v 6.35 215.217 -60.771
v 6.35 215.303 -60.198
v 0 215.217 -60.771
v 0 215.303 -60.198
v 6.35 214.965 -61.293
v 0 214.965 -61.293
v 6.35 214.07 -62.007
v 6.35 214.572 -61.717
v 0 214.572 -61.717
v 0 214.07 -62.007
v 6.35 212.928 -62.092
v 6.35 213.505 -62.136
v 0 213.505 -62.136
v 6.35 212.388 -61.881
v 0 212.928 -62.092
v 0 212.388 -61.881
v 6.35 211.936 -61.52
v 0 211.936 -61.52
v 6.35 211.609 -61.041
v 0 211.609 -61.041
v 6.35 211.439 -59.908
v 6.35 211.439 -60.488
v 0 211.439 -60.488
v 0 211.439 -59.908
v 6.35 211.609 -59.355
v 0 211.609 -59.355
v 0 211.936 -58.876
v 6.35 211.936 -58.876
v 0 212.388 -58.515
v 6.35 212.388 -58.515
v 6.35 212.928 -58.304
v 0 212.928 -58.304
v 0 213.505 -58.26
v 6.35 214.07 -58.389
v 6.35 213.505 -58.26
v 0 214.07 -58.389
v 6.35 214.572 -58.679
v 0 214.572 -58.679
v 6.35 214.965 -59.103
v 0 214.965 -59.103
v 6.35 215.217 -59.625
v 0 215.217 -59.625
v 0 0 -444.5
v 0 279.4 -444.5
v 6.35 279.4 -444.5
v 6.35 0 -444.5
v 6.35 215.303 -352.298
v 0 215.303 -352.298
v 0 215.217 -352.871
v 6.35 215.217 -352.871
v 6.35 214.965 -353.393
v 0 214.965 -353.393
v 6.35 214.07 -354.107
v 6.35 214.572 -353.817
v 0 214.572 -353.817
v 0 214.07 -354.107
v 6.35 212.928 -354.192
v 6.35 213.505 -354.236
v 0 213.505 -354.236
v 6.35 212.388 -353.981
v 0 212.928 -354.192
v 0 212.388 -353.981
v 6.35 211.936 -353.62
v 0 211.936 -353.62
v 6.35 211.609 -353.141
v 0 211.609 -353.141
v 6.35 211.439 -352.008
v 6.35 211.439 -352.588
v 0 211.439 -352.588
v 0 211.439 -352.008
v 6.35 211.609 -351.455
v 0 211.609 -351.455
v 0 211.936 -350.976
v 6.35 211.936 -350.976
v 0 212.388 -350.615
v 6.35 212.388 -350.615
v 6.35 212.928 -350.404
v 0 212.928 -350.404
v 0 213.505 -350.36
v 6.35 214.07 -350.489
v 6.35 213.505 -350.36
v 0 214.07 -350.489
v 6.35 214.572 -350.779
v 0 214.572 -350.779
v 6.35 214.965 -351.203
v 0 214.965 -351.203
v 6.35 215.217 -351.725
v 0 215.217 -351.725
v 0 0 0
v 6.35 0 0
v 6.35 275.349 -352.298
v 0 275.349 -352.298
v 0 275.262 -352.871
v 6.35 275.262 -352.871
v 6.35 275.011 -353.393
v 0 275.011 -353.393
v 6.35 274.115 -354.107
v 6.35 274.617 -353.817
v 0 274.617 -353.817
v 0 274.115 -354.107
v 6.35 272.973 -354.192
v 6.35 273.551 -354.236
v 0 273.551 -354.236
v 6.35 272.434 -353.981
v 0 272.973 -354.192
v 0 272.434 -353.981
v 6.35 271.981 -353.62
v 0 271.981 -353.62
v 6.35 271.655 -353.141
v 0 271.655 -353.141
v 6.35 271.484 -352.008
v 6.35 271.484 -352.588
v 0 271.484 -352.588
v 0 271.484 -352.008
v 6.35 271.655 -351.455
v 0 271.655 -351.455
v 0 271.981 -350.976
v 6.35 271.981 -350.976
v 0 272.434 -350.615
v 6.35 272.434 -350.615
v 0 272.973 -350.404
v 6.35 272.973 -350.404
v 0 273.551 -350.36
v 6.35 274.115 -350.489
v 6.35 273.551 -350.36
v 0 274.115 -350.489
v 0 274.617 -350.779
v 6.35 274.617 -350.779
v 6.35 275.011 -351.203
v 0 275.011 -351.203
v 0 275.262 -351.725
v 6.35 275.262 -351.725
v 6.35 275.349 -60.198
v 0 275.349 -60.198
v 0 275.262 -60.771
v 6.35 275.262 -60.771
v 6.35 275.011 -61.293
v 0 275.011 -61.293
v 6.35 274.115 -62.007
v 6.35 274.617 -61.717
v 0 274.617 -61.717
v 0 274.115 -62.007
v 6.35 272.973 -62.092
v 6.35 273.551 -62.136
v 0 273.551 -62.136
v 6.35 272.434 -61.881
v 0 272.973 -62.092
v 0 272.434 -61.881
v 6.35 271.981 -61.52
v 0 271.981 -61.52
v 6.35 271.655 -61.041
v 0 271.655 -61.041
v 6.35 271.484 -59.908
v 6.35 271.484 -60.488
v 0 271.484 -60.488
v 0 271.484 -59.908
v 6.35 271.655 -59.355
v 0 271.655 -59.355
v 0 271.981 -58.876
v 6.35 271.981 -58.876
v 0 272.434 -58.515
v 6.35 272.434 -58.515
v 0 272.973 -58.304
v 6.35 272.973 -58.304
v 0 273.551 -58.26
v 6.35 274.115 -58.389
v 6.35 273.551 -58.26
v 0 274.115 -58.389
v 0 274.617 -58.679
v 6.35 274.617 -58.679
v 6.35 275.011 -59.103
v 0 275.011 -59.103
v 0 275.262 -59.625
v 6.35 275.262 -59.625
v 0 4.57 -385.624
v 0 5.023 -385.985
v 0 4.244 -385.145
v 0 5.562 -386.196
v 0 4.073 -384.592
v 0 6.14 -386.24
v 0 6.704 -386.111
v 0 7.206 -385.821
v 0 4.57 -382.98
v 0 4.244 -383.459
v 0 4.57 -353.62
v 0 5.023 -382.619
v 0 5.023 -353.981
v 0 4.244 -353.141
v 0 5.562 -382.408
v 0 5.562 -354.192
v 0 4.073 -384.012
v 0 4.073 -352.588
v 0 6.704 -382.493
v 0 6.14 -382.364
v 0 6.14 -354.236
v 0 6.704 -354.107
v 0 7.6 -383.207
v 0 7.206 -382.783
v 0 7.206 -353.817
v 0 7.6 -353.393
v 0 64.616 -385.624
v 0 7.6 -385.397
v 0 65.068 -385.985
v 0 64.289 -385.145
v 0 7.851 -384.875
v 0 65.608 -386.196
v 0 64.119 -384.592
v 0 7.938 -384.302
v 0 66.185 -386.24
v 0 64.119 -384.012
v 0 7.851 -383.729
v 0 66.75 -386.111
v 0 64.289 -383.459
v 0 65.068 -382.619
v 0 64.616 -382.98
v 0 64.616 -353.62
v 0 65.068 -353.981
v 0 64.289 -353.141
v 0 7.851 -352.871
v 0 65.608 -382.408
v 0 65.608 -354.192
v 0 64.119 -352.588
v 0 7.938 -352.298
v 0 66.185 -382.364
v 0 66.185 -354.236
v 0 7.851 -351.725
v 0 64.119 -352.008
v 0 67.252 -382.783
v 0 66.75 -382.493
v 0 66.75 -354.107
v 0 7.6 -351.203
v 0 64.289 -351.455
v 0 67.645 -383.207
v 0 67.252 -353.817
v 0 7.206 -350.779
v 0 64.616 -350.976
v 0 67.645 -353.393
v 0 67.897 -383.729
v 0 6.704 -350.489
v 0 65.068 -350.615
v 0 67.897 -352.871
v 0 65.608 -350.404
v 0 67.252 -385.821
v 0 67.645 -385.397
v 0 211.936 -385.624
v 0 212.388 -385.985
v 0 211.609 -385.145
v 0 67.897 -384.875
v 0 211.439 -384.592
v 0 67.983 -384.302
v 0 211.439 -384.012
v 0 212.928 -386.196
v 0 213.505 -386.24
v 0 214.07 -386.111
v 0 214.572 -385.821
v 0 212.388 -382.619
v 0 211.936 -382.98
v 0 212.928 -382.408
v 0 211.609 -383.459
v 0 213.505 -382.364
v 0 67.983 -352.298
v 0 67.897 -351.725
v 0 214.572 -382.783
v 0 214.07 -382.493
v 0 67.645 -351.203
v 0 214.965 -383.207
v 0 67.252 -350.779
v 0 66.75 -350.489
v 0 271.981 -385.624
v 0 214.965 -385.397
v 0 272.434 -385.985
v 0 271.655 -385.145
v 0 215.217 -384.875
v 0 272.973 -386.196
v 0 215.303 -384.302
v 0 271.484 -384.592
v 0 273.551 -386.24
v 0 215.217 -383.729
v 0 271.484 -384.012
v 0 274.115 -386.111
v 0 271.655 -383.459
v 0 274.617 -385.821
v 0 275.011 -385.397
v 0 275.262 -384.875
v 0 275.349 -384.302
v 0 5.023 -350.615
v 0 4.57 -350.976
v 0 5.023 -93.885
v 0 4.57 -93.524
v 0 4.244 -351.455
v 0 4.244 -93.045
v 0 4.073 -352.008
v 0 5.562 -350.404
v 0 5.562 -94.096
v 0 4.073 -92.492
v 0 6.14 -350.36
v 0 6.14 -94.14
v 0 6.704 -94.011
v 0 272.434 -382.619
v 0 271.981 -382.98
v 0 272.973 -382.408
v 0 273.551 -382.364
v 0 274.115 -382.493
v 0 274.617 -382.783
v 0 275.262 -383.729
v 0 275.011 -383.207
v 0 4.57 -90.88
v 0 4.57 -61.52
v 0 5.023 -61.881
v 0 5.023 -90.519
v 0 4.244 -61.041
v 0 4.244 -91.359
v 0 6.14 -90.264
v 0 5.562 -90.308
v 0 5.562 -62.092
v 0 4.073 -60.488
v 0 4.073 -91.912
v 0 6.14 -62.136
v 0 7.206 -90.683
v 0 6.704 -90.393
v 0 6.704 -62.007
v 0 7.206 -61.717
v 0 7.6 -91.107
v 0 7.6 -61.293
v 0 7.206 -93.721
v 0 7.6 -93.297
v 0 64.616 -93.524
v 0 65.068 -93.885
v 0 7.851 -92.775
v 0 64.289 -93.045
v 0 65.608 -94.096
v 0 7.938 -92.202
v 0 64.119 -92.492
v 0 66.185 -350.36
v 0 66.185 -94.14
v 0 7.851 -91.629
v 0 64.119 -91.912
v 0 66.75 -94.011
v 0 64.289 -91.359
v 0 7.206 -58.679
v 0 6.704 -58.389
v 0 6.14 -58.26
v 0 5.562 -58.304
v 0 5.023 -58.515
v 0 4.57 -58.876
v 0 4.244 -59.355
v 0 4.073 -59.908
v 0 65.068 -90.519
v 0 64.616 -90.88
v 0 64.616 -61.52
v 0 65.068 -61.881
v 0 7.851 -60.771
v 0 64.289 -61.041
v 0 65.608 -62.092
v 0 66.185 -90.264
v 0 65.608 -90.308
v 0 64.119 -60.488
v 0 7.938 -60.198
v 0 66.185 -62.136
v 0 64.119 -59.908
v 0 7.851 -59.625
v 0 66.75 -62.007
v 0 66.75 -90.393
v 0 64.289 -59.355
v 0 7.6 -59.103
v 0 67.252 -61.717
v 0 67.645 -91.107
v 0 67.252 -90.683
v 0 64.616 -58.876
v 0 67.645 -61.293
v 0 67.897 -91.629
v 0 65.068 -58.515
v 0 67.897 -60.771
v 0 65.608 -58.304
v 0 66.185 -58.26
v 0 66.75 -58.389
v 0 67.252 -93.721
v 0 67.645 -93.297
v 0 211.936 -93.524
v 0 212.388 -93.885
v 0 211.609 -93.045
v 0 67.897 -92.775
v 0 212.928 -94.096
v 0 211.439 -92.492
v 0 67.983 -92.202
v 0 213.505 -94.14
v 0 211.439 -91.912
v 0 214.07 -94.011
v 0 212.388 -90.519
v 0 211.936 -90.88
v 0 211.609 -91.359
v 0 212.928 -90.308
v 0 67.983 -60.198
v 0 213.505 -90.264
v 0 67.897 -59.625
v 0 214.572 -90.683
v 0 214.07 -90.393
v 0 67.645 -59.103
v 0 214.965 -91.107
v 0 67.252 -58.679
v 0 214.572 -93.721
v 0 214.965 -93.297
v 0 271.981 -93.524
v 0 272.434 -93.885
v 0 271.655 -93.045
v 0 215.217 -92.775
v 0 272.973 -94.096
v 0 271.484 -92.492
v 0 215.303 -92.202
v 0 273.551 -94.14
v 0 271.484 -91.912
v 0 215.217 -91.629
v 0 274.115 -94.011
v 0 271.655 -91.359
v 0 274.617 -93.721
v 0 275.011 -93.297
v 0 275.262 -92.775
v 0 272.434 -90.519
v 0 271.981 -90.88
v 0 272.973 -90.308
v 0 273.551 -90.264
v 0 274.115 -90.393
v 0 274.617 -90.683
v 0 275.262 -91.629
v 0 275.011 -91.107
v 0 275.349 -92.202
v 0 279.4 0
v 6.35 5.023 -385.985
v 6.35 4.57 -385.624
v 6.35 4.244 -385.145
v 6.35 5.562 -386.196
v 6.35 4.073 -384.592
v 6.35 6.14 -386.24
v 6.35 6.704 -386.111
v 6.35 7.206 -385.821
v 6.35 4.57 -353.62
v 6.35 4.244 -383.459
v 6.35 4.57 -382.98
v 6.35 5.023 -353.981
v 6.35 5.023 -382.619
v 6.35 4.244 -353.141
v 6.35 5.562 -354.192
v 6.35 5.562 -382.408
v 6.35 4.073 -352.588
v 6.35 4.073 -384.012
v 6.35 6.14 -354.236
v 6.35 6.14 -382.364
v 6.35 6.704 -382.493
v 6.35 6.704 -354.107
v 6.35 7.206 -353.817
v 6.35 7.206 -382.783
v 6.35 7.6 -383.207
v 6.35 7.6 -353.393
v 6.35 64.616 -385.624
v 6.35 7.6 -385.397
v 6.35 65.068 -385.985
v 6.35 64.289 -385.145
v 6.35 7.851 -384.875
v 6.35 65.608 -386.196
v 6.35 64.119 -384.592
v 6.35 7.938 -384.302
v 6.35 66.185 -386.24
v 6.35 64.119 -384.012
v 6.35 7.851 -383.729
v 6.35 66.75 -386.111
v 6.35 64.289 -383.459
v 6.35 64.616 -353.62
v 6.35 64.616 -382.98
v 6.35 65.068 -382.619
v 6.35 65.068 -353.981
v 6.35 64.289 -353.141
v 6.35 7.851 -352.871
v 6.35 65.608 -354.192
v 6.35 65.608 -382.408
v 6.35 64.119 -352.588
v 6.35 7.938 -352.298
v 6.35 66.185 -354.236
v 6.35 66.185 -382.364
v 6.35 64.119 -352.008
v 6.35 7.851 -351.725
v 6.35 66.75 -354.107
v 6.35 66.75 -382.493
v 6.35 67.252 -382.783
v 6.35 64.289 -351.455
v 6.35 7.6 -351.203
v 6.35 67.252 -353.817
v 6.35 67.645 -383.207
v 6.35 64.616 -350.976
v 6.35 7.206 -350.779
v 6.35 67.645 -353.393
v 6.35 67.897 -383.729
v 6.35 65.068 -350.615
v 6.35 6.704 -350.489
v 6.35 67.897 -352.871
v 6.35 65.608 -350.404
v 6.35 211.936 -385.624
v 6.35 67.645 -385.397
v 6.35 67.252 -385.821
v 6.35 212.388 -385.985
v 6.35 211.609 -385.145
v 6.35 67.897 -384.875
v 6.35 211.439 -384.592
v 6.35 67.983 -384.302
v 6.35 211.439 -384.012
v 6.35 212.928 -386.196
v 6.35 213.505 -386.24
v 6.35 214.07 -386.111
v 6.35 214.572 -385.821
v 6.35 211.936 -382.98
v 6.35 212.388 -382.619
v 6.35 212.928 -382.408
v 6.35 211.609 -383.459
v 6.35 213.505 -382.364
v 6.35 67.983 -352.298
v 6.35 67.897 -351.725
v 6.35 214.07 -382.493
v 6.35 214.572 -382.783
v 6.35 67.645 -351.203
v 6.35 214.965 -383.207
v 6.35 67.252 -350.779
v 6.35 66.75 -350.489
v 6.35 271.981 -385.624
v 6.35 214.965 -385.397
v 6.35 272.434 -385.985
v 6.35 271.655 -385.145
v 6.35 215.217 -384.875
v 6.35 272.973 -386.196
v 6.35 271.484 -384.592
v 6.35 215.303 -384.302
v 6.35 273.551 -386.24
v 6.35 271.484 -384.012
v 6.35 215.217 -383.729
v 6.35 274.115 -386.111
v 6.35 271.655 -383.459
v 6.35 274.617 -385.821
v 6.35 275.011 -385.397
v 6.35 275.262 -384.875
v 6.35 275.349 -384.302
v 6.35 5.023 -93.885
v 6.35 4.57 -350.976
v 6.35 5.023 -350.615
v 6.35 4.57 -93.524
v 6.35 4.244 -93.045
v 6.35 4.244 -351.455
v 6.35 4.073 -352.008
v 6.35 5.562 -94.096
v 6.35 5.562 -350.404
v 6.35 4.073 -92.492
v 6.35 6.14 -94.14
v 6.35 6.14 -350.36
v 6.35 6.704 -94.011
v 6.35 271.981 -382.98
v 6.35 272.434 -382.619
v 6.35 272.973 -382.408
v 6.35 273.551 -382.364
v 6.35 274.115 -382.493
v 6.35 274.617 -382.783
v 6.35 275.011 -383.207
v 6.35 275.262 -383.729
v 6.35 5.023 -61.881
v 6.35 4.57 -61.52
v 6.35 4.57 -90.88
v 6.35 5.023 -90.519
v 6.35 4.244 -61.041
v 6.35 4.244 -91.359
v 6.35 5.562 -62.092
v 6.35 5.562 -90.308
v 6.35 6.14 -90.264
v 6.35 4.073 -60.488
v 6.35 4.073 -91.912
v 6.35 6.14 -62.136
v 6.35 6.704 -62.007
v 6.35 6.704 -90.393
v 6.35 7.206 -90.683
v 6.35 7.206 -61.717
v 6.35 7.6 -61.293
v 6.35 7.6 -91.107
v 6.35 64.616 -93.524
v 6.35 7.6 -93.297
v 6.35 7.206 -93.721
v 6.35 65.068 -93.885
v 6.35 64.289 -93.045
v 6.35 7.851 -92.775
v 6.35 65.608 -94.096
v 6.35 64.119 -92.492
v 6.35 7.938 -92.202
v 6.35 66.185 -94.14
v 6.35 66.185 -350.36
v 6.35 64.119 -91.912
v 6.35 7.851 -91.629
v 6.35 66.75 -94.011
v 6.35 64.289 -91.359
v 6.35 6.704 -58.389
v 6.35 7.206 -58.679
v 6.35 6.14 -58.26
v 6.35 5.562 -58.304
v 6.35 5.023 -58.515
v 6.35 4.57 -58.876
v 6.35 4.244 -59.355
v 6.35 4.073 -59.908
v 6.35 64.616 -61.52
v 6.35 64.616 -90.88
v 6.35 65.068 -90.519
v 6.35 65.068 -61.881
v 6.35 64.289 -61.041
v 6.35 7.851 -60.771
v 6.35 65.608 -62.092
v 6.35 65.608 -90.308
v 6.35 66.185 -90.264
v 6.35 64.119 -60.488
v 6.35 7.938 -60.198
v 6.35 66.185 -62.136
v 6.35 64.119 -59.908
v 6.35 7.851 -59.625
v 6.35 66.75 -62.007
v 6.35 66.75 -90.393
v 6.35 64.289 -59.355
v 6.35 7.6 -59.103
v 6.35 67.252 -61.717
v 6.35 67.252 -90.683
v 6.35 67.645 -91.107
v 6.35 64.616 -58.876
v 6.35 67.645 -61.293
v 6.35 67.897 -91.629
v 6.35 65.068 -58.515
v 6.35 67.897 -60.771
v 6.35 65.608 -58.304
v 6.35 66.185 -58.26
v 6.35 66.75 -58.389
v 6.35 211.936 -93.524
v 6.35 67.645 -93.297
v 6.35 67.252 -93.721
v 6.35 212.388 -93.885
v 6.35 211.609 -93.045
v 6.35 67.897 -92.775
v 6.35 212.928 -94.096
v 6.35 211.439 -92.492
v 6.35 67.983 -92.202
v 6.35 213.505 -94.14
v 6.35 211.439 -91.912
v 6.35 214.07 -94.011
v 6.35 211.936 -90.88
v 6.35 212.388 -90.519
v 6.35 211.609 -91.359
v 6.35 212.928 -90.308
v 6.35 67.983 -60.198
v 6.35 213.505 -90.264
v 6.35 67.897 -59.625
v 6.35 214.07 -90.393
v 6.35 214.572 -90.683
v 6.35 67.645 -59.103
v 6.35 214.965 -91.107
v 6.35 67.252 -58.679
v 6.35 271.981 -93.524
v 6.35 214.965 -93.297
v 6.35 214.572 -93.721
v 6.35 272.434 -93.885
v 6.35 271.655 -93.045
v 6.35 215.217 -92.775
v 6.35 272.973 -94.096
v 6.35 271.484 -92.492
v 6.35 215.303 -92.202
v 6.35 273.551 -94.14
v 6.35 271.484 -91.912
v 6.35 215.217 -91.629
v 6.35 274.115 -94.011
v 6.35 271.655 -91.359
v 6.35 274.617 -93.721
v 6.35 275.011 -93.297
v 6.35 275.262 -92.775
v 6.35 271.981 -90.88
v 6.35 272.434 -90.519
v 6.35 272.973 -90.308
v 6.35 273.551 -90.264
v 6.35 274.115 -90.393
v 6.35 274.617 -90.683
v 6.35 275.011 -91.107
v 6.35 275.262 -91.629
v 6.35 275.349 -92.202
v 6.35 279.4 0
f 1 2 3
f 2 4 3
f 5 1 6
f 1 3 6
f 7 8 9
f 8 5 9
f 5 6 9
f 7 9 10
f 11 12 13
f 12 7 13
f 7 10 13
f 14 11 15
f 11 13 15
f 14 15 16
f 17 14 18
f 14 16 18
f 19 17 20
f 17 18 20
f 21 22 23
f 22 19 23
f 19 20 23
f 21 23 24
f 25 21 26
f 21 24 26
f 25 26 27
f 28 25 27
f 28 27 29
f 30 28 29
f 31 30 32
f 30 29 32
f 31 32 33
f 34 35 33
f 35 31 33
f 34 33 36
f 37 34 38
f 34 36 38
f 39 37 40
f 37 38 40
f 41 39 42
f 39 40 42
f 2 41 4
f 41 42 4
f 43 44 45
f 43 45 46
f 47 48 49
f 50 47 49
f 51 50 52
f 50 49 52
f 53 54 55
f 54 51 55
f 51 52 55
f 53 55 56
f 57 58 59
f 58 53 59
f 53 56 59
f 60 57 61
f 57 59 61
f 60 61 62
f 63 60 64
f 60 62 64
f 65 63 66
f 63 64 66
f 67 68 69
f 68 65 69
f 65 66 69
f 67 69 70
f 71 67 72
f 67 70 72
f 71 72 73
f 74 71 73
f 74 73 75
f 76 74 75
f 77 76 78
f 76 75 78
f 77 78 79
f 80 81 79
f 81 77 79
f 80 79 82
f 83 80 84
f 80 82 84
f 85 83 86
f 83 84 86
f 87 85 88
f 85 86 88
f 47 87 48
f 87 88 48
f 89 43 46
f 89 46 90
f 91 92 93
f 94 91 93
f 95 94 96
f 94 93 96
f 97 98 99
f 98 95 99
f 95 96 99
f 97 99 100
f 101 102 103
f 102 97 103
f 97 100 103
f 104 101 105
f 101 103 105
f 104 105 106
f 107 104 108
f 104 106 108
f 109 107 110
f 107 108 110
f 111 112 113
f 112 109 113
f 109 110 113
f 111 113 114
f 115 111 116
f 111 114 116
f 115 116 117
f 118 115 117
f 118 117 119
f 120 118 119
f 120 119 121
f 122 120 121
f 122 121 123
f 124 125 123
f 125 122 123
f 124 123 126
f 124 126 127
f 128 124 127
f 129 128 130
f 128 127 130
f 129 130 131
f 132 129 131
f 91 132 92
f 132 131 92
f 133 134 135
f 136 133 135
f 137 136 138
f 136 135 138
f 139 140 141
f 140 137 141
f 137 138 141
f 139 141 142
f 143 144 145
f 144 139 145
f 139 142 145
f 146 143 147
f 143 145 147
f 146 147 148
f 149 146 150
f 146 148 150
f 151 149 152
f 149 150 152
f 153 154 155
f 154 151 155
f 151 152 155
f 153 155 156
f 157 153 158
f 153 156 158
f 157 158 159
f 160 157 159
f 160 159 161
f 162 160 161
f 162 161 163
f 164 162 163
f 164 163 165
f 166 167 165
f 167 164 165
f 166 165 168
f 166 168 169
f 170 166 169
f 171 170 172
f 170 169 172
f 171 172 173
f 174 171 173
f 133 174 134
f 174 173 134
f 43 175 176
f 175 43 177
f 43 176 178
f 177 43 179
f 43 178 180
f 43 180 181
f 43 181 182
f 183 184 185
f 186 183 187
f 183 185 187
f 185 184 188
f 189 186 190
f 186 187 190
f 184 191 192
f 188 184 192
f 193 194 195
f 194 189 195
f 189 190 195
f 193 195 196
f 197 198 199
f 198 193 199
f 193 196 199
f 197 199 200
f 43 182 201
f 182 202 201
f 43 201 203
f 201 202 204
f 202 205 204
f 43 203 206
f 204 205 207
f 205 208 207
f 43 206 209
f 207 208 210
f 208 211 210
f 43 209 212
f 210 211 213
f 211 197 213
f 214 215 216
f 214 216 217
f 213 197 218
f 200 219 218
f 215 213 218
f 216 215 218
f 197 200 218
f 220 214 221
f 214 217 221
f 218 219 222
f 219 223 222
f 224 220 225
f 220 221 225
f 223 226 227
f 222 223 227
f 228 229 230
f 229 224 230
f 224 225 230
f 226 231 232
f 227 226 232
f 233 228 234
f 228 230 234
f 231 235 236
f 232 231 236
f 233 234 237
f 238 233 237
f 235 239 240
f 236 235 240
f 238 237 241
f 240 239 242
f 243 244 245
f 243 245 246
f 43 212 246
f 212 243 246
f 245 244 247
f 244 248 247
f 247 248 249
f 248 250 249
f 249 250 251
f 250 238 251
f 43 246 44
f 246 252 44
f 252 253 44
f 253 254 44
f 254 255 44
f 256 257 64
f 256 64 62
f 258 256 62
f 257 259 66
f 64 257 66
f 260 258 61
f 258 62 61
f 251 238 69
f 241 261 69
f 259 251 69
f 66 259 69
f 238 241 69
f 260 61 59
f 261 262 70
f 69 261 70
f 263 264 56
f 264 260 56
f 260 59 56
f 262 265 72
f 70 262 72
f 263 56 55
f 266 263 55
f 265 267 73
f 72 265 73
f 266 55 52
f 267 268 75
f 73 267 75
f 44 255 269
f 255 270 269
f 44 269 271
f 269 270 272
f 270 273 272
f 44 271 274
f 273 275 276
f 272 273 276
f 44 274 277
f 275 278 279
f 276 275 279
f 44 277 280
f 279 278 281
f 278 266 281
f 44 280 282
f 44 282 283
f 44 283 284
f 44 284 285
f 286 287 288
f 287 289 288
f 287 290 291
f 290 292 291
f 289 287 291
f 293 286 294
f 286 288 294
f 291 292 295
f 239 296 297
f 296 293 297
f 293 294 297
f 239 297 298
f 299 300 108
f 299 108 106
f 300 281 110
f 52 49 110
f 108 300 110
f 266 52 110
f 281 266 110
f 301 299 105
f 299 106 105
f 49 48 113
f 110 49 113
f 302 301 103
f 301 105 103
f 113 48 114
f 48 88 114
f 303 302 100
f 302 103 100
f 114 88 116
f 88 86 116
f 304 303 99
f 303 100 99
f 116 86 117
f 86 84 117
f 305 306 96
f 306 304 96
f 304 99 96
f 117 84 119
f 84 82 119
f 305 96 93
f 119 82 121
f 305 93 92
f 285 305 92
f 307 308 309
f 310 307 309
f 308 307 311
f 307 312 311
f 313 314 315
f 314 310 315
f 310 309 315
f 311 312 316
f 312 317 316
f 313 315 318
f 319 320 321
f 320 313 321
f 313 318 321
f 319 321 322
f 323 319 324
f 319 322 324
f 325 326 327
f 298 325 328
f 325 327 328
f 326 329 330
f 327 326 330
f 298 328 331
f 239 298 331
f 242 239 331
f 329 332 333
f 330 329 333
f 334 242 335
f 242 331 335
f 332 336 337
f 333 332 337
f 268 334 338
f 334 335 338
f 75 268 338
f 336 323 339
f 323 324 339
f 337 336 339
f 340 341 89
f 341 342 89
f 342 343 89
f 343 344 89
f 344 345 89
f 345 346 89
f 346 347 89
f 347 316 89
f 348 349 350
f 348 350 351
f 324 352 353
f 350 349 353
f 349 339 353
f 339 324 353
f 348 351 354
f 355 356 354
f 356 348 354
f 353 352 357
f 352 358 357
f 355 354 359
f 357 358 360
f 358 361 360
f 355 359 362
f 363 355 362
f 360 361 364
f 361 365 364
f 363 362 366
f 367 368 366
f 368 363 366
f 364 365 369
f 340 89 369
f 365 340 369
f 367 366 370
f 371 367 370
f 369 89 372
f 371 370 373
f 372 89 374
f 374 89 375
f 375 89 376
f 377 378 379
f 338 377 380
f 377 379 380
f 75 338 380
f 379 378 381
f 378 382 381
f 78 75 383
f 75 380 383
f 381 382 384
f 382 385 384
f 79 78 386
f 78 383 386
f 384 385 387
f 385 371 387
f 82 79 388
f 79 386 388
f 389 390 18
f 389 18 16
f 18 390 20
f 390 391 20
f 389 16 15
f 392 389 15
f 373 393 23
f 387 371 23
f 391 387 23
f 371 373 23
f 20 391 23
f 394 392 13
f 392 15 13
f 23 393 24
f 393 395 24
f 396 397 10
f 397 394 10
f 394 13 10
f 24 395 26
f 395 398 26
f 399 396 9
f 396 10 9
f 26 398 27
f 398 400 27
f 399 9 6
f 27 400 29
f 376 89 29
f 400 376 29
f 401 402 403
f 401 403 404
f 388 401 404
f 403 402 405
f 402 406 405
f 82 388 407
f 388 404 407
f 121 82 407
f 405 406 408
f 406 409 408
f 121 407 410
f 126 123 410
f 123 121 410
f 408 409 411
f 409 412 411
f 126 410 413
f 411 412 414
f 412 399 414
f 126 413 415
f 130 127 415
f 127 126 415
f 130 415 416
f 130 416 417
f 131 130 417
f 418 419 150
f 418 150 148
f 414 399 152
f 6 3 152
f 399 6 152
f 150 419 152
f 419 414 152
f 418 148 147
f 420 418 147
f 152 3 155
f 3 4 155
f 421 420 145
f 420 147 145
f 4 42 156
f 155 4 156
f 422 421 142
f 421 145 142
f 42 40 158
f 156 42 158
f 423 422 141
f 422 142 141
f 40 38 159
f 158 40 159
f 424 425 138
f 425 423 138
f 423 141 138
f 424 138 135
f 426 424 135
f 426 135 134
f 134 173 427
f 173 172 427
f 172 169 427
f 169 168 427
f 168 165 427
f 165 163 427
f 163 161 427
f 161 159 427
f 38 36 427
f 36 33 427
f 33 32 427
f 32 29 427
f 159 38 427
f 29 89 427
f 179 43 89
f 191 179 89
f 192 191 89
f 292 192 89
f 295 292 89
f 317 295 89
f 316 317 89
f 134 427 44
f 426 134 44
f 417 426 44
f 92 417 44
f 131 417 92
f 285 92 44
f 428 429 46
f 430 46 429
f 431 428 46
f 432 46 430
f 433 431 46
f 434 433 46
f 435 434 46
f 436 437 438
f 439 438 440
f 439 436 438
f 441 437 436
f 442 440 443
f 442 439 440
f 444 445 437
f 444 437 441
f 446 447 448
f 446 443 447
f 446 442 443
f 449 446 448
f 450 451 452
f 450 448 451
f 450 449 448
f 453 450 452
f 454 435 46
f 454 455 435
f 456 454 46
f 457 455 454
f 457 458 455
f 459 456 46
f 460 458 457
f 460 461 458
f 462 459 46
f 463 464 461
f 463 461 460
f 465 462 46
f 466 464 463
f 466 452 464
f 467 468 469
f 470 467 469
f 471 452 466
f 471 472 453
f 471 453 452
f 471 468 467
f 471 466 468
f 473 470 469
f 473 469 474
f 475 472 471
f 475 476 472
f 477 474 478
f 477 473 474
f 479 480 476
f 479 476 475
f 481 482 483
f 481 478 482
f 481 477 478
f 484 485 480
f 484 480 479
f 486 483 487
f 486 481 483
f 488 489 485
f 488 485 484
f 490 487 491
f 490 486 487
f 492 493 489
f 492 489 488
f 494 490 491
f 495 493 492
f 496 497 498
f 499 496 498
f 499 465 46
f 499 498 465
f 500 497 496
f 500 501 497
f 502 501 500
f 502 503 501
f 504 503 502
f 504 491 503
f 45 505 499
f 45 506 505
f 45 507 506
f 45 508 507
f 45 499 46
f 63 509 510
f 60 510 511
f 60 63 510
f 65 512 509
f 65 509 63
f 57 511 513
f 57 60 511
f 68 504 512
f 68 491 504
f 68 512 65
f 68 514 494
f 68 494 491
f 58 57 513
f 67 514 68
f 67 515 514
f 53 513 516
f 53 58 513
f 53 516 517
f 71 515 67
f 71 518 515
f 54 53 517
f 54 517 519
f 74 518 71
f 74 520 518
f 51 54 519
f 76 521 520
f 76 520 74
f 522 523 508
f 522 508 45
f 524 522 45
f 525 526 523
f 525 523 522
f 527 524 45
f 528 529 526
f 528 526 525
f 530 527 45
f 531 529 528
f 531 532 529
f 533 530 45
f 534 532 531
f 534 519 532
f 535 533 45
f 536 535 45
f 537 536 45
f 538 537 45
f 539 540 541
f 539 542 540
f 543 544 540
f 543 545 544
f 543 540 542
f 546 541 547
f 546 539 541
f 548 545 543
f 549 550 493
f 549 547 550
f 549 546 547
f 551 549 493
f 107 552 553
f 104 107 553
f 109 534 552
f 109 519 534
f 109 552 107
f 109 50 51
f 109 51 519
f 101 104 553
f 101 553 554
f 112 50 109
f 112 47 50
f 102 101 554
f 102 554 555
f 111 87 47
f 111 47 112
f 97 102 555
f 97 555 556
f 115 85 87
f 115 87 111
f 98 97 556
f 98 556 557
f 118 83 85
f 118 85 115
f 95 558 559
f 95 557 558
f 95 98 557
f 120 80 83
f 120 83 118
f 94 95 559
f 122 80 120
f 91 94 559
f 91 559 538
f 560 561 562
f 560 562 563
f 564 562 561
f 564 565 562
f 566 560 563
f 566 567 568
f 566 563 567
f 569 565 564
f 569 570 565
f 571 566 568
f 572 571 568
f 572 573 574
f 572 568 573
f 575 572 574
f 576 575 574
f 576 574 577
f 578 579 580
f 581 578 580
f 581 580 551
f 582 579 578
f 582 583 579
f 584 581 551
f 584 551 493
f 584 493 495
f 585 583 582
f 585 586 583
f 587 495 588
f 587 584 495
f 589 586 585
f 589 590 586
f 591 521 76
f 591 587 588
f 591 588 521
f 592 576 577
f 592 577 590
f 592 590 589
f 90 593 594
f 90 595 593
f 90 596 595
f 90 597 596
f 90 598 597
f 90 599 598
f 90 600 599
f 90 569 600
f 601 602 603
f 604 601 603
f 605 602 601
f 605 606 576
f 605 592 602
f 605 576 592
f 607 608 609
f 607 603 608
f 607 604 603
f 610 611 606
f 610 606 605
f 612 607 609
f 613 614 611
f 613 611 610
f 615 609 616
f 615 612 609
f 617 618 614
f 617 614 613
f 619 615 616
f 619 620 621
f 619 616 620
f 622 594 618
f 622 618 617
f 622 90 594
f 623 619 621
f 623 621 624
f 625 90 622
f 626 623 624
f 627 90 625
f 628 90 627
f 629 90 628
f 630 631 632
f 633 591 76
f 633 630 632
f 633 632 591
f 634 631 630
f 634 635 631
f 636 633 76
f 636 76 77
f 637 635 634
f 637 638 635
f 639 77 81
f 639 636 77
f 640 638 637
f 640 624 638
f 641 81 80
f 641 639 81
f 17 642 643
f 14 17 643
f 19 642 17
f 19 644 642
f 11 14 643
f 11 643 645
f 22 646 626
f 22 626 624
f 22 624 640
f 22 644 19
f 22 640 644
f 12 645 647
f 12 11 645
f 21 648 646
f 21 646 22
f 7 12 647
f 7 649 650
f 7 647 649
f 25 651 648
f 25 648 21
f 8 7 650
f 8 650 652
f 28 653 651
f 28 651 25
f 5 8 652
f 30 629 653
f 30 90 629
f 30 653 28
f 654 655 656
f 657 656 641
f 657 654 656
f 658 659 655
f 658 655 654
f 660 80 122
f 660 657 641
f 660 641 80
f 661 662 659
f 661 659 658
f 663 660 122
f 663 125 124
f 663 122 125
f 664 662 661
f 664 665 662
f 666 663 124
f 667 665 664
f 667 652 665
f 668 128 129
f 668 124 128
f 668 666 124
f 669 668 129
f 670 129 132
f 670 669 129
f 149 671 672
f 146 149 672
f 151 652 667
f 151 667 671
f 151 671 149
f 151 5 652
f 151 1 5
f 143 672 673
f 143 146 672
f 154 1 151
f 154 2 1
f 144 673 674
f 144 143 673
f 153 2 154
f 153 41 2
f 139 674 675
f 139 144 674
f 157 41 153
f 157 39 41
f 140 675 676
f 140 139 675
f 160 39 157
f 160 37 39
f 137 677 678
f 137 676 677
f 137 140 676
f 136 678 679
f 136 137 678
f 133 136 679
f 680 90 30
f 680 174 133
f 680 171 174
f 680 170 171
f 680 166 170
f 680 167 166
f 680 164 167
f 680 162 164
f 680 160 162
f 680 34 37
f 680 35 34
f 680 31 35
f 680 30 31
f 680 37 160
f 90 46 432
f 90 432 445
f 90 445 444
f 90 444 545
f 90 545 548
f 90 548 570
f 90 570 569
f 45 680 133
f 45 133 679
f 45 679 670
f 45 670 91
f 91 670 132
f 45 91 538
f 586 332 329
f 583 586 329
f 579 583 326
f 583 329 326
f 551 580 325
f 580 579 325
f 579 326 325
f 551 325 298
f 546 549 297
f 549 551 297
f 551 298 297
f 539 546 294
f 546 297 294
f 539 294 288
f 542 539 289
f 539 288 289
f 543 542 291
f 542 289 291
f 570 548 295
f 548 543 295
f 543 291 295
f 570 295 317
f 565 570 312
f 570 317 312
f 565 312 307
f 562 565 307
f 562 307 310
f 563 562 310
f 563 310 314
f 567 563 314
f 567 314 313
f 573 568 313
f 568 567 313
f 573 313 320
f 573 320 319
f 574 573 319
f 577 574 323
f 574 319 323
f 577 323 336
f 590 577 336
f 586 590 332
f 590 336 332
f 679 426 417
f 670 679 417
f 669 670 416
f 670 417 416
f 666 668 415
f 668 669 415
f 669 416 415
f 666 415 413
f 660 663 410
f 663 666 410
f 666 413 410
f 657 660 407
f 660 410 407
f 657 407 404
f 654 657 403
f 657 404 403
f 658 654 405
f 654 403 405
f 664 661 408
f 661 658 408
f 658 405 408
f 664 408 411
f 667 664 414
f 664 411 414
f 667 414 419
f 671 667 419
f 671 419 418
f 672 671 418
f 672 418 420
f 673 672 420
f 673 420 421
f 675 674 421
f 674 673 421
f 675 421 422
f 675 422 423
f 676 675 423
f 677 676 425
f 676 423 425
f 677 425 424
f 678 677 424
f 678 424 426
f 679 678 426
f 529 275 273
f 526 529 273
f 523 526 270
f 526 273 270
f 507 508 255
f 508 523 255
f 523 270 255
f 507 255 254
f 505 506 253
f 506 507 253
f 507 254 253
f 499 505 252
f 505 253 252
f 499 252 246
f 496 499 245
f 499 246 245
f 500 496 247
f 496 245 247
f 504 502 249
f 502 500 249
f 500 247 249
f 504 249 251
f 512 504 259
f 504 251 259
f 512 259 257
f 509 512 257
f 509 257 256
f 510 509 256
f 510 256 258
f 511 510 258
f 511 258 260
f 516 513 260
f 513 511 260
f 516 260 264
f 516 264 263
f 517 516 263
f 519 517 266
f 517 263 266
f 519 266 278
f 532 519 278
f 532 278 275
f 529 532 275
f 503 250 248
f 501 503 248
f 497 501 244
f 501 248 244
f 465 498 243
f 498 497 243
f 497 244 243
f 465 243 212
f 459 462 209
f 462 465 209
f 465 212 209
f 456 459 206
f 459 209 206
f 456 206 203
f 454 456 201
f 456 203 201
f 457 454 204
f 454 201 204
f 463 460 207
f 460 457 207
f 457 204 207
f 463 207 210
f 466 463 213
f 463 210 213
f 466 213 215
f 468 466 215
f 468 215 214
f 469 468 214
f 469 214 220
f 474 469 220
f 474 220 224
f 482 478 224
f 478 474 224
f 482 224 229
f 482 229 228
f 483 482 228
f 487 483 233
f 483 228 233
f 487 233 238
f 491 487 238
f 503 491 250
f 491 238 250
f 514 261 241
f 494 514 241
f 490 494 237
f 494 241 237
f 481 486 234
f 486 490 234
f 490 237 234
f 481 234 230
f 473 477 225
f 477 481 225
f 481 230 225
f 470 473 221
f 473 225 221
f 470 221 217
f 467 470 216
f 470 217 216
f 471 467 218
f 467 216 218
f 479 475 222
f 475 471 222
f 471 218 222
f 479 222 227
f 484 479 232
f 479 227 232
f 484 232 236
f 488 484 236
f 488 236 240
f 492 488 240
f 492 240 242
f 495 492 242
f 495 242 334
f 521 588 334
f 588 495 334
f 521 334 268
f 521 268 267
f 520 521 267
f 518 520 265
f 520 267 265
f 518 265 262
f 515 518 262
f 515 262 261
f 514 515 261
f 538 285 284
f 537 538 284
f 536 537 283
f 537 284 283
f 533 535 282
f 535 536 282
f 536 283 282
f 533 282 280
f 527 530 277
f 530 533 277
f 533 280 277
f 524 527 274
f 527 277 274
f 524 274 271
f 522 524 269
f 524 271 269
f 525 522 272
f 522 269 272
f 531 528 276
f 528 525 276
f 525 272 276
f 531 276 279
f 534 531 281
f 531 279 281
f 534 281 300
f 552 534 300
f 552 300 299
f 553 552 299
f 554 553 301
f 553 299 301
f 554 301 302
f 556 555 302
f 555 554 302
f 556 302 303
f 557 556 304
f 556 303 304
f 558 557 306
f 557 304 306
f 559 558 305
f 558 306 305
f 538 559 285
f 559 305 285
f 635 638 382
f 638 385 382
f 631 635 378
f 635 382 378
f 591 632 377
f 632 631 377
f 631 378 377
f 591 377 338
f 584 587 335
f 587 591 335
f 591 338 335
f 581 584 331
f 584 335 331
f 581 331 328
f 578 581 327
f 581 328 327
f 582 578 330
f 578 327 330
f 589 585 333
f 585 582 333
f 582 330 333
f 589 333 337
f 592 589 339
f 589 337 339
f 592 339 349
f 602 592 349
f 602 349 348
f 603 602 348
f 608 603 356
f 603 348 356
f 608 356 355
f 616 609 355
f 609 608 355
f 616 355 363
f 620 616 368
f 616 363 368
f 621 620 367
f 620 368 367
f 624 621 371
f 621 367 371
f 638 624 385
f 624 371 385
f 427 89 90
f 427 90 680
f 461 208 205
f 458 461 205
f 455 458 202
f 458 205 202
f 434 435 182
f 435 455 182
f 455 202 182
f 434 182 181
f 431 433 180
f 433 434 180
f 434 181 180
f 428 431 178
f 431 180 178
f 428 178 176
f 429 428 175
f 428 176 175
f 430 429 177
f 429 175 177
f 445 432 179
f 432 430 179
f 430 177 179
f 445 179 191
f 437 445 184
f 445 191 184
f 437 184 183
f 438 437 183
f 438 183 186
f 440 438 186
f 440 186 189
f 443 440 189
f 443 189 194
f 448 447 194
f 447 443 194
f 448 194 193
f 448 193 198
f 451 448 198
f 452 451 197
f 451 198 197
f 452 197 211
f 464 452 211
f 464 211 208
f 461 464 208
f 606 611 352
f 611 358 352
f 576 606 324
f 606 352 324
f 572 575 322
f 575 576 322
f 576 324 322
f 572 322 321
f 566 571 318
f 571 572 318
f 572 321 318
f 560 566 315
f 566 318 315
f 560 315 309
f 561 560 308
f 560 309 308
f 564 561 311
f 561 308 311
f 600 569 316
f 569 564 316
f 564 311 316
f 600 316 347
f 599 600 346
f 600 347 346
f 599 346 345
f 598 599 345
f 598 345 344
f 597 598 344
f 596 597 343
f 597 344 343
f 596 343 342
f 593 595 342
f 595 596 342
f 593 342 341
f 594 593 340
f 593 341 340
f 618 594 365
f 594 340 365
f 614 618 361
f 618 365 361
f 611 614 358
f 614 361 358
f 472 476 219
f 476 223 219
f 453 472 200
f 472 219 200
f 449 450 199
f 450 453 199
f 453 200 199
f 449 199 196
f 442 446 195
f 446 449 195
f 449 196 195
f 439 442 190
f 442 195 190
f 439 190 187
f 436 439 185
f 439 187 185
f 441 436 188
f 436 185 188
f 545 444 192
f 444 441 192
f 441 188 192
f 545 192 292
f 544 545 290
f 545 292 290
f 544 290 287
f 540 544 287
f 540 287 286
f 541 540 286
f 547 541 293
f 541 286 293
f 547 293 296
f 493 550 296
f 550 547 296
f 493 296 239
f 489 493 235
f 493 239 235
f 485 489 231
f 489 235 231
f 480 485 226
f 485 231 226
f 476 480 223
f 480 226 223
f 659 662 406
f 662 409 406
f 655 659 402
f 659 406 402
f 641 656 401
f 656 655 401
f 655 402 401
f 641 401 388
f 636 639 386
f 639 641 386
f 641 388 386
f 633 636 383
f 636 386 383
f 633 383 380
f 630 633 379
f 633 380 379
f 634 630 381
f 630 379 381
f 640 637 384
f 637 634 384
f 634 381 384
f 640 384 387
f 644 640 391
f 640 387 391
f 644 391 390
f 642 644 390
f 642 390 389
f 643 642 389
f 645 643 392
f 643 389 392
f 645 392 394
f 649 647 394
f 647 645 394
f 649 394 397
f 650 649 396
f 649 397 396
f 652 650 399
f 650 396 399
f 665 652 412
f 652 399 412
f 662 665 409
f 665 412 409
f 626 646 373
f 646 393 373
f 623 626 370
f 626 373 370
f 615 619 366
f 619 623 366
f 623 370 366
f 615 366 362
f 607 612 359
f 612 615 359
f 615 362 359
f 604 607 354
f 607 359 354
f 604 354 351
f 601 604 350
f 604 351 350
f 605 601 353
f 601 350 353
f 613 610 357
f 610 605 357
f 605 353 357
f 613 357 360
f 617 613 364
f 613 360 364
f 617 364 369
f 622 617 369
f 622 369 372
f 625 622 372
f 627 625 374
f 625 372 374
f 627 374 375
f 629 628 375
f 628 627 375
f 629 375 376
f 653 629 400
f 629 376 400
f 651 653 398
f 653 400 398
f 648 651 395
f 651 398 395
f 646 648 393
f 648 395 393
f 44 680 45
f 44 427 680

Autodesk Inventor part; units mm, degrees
ref_plane "YZ Plane" through (0, 0, 0) normal (1, 0, 0) x (0, 1, 0)
ref_plane "XZ Plane" through (0, 0, 0) normal (0, 1, 0) x (-1, 0, 0)
ref_plane "XY Plane" through (0, 0, 0) normal (0, 0, 1) x (1, 0, 0)
sketch "Sketch1" plane through (0, 0, 0) normal (1, 0, 0) x (0, 1, 0)
  line L0 (0, 0) -> (279.4, 0)
  line L1 (279.4, 0) -> (279.4, -444.5)
  line L2 (279.4, -444.5) -> (0, -444.5)
  line L3 (0, -444.5) -> (0, 0)
  circle A0 centre (273.4056, -60.198) radius 1.9431
  circle A1 centre (273.4056, -92.202) radius 1.9431
  circle A2 centre (213.36, -60.198) radius 1.9431
  circle A3 centre (213.36, -92.202) radius 1.9431
  circle A4 centre (66.04, -60.198) radius 1.9431
  circle A5 centre (66.04, -92.202) radius 1.9431
  circle A6 centre (5.9944, -60.198) radius 1.9431
  circle A7 centre (5.9944, -92.202) radius 1.9431
  circle A8 centre (273.4056, -352.298) radius 1.9431
  circle A9 centre (273.4056, -384.302) radius 1.9431
  circle A10 centre (213.36, -352.298) radius 1.9431
  circle A11 centre (213.36, -384.302) radius 1.9431
  circle A12 centre (66.04, -352.298) radius 1.9431
  circle A13 centre (66.04, -384.302) radius 1.9431
  circle A14 centre (5.9944, -384.302) radius 1.9431
  circle A15 centre (5.9944, -352.298) radius 1.9431
  dimension "d0" = 279.4
  dimension "d1" = 444.5
  dimension "d2" = 3.8862
  dimension "d3" = 3.8862
  dimension "d4" = 32.004
  dimension "d5" = 5.9944
  dimension "d6" = 5.9944
  dimension "d7" = 60.198
  dimension "d8" = 3.8862
  dimension "d9" = 3.8862
  dimension "d10" = 60.0456
  dimension "d11" = 60.0456
  dimension "d12" = 60.198
  dimension "d13" = 3.8862
  dimension "d14" = 3.8862
  dimension "d15" = 3.8862
  dimension "d16" = 3.8862
  dimension "d17" = 60.198
  dimension "d18" = 60.198
  dimension "d19" = 5.9944
  dimension "d20" = 5.9944
  dimension "d22" = 60.0456
  dimension "d23" = 60.0456
  dimension "d24" = 32.004
  dimension "d25" = 3.8862
  dimension "d26" = 3.8862
  dimension "d27" = 5.9944
  dimension "d28" = 5.9944
  dimension "d29" = 3.8862
  dimension "d30" = 3.8862
  dimension "d32" = 32.004
  dimension "d33" = 32.004
  dimension "d34" = 60.198
  dimension "d35" = 60.198
  dimension "d36" = 3.8862
  dimension "d37" = 3.8862
  dimension "d38" = 3.8862
  dimension "d39" = 3.8862
extrude "Extrusion1" add sketch "Sketch1" along normal blind 6.35
equation "\"d3\" = d2"
equation "\"d6\" = d5"
equation "\"d8\" = d2"
equation "\"d9\" = d2"
equation "\"d11\" = d10"
equation "\"d12\" = d7"
equation "\"d13\" = d2"
equation "\"d14\" = d2"
equation "\"d15\" = d2"
equation "\"d16\" = d2"
equation "\"d17\" = d12"
equation "\"d18\" = d7"
equation "\"d19\" = d5"
equation "\"d20\" = d19"
equation "\"d22\" = d10"
equation "\"d23\" = d22"
equation "\"d25\" = d2"
equation "\"d26\" = d25"
equation "\"d27\" = d5"
equation "\"d28\" = d27"
equation "\"d29\" = d25"
equation "\"d30\" = d25"
equation "\"d32\" = d4"
equation "\"d33\" = d32"
equation "\"d34\" = d7"
equation "\"d35\" = d34"
equation "\"d36\" = d2"
equation "\"d37\" = d2"
equation "\"d38\" = d2"
equation "\"d39\" = d2"
properties part number "PlateFrame" material "Aluminum 6061"
